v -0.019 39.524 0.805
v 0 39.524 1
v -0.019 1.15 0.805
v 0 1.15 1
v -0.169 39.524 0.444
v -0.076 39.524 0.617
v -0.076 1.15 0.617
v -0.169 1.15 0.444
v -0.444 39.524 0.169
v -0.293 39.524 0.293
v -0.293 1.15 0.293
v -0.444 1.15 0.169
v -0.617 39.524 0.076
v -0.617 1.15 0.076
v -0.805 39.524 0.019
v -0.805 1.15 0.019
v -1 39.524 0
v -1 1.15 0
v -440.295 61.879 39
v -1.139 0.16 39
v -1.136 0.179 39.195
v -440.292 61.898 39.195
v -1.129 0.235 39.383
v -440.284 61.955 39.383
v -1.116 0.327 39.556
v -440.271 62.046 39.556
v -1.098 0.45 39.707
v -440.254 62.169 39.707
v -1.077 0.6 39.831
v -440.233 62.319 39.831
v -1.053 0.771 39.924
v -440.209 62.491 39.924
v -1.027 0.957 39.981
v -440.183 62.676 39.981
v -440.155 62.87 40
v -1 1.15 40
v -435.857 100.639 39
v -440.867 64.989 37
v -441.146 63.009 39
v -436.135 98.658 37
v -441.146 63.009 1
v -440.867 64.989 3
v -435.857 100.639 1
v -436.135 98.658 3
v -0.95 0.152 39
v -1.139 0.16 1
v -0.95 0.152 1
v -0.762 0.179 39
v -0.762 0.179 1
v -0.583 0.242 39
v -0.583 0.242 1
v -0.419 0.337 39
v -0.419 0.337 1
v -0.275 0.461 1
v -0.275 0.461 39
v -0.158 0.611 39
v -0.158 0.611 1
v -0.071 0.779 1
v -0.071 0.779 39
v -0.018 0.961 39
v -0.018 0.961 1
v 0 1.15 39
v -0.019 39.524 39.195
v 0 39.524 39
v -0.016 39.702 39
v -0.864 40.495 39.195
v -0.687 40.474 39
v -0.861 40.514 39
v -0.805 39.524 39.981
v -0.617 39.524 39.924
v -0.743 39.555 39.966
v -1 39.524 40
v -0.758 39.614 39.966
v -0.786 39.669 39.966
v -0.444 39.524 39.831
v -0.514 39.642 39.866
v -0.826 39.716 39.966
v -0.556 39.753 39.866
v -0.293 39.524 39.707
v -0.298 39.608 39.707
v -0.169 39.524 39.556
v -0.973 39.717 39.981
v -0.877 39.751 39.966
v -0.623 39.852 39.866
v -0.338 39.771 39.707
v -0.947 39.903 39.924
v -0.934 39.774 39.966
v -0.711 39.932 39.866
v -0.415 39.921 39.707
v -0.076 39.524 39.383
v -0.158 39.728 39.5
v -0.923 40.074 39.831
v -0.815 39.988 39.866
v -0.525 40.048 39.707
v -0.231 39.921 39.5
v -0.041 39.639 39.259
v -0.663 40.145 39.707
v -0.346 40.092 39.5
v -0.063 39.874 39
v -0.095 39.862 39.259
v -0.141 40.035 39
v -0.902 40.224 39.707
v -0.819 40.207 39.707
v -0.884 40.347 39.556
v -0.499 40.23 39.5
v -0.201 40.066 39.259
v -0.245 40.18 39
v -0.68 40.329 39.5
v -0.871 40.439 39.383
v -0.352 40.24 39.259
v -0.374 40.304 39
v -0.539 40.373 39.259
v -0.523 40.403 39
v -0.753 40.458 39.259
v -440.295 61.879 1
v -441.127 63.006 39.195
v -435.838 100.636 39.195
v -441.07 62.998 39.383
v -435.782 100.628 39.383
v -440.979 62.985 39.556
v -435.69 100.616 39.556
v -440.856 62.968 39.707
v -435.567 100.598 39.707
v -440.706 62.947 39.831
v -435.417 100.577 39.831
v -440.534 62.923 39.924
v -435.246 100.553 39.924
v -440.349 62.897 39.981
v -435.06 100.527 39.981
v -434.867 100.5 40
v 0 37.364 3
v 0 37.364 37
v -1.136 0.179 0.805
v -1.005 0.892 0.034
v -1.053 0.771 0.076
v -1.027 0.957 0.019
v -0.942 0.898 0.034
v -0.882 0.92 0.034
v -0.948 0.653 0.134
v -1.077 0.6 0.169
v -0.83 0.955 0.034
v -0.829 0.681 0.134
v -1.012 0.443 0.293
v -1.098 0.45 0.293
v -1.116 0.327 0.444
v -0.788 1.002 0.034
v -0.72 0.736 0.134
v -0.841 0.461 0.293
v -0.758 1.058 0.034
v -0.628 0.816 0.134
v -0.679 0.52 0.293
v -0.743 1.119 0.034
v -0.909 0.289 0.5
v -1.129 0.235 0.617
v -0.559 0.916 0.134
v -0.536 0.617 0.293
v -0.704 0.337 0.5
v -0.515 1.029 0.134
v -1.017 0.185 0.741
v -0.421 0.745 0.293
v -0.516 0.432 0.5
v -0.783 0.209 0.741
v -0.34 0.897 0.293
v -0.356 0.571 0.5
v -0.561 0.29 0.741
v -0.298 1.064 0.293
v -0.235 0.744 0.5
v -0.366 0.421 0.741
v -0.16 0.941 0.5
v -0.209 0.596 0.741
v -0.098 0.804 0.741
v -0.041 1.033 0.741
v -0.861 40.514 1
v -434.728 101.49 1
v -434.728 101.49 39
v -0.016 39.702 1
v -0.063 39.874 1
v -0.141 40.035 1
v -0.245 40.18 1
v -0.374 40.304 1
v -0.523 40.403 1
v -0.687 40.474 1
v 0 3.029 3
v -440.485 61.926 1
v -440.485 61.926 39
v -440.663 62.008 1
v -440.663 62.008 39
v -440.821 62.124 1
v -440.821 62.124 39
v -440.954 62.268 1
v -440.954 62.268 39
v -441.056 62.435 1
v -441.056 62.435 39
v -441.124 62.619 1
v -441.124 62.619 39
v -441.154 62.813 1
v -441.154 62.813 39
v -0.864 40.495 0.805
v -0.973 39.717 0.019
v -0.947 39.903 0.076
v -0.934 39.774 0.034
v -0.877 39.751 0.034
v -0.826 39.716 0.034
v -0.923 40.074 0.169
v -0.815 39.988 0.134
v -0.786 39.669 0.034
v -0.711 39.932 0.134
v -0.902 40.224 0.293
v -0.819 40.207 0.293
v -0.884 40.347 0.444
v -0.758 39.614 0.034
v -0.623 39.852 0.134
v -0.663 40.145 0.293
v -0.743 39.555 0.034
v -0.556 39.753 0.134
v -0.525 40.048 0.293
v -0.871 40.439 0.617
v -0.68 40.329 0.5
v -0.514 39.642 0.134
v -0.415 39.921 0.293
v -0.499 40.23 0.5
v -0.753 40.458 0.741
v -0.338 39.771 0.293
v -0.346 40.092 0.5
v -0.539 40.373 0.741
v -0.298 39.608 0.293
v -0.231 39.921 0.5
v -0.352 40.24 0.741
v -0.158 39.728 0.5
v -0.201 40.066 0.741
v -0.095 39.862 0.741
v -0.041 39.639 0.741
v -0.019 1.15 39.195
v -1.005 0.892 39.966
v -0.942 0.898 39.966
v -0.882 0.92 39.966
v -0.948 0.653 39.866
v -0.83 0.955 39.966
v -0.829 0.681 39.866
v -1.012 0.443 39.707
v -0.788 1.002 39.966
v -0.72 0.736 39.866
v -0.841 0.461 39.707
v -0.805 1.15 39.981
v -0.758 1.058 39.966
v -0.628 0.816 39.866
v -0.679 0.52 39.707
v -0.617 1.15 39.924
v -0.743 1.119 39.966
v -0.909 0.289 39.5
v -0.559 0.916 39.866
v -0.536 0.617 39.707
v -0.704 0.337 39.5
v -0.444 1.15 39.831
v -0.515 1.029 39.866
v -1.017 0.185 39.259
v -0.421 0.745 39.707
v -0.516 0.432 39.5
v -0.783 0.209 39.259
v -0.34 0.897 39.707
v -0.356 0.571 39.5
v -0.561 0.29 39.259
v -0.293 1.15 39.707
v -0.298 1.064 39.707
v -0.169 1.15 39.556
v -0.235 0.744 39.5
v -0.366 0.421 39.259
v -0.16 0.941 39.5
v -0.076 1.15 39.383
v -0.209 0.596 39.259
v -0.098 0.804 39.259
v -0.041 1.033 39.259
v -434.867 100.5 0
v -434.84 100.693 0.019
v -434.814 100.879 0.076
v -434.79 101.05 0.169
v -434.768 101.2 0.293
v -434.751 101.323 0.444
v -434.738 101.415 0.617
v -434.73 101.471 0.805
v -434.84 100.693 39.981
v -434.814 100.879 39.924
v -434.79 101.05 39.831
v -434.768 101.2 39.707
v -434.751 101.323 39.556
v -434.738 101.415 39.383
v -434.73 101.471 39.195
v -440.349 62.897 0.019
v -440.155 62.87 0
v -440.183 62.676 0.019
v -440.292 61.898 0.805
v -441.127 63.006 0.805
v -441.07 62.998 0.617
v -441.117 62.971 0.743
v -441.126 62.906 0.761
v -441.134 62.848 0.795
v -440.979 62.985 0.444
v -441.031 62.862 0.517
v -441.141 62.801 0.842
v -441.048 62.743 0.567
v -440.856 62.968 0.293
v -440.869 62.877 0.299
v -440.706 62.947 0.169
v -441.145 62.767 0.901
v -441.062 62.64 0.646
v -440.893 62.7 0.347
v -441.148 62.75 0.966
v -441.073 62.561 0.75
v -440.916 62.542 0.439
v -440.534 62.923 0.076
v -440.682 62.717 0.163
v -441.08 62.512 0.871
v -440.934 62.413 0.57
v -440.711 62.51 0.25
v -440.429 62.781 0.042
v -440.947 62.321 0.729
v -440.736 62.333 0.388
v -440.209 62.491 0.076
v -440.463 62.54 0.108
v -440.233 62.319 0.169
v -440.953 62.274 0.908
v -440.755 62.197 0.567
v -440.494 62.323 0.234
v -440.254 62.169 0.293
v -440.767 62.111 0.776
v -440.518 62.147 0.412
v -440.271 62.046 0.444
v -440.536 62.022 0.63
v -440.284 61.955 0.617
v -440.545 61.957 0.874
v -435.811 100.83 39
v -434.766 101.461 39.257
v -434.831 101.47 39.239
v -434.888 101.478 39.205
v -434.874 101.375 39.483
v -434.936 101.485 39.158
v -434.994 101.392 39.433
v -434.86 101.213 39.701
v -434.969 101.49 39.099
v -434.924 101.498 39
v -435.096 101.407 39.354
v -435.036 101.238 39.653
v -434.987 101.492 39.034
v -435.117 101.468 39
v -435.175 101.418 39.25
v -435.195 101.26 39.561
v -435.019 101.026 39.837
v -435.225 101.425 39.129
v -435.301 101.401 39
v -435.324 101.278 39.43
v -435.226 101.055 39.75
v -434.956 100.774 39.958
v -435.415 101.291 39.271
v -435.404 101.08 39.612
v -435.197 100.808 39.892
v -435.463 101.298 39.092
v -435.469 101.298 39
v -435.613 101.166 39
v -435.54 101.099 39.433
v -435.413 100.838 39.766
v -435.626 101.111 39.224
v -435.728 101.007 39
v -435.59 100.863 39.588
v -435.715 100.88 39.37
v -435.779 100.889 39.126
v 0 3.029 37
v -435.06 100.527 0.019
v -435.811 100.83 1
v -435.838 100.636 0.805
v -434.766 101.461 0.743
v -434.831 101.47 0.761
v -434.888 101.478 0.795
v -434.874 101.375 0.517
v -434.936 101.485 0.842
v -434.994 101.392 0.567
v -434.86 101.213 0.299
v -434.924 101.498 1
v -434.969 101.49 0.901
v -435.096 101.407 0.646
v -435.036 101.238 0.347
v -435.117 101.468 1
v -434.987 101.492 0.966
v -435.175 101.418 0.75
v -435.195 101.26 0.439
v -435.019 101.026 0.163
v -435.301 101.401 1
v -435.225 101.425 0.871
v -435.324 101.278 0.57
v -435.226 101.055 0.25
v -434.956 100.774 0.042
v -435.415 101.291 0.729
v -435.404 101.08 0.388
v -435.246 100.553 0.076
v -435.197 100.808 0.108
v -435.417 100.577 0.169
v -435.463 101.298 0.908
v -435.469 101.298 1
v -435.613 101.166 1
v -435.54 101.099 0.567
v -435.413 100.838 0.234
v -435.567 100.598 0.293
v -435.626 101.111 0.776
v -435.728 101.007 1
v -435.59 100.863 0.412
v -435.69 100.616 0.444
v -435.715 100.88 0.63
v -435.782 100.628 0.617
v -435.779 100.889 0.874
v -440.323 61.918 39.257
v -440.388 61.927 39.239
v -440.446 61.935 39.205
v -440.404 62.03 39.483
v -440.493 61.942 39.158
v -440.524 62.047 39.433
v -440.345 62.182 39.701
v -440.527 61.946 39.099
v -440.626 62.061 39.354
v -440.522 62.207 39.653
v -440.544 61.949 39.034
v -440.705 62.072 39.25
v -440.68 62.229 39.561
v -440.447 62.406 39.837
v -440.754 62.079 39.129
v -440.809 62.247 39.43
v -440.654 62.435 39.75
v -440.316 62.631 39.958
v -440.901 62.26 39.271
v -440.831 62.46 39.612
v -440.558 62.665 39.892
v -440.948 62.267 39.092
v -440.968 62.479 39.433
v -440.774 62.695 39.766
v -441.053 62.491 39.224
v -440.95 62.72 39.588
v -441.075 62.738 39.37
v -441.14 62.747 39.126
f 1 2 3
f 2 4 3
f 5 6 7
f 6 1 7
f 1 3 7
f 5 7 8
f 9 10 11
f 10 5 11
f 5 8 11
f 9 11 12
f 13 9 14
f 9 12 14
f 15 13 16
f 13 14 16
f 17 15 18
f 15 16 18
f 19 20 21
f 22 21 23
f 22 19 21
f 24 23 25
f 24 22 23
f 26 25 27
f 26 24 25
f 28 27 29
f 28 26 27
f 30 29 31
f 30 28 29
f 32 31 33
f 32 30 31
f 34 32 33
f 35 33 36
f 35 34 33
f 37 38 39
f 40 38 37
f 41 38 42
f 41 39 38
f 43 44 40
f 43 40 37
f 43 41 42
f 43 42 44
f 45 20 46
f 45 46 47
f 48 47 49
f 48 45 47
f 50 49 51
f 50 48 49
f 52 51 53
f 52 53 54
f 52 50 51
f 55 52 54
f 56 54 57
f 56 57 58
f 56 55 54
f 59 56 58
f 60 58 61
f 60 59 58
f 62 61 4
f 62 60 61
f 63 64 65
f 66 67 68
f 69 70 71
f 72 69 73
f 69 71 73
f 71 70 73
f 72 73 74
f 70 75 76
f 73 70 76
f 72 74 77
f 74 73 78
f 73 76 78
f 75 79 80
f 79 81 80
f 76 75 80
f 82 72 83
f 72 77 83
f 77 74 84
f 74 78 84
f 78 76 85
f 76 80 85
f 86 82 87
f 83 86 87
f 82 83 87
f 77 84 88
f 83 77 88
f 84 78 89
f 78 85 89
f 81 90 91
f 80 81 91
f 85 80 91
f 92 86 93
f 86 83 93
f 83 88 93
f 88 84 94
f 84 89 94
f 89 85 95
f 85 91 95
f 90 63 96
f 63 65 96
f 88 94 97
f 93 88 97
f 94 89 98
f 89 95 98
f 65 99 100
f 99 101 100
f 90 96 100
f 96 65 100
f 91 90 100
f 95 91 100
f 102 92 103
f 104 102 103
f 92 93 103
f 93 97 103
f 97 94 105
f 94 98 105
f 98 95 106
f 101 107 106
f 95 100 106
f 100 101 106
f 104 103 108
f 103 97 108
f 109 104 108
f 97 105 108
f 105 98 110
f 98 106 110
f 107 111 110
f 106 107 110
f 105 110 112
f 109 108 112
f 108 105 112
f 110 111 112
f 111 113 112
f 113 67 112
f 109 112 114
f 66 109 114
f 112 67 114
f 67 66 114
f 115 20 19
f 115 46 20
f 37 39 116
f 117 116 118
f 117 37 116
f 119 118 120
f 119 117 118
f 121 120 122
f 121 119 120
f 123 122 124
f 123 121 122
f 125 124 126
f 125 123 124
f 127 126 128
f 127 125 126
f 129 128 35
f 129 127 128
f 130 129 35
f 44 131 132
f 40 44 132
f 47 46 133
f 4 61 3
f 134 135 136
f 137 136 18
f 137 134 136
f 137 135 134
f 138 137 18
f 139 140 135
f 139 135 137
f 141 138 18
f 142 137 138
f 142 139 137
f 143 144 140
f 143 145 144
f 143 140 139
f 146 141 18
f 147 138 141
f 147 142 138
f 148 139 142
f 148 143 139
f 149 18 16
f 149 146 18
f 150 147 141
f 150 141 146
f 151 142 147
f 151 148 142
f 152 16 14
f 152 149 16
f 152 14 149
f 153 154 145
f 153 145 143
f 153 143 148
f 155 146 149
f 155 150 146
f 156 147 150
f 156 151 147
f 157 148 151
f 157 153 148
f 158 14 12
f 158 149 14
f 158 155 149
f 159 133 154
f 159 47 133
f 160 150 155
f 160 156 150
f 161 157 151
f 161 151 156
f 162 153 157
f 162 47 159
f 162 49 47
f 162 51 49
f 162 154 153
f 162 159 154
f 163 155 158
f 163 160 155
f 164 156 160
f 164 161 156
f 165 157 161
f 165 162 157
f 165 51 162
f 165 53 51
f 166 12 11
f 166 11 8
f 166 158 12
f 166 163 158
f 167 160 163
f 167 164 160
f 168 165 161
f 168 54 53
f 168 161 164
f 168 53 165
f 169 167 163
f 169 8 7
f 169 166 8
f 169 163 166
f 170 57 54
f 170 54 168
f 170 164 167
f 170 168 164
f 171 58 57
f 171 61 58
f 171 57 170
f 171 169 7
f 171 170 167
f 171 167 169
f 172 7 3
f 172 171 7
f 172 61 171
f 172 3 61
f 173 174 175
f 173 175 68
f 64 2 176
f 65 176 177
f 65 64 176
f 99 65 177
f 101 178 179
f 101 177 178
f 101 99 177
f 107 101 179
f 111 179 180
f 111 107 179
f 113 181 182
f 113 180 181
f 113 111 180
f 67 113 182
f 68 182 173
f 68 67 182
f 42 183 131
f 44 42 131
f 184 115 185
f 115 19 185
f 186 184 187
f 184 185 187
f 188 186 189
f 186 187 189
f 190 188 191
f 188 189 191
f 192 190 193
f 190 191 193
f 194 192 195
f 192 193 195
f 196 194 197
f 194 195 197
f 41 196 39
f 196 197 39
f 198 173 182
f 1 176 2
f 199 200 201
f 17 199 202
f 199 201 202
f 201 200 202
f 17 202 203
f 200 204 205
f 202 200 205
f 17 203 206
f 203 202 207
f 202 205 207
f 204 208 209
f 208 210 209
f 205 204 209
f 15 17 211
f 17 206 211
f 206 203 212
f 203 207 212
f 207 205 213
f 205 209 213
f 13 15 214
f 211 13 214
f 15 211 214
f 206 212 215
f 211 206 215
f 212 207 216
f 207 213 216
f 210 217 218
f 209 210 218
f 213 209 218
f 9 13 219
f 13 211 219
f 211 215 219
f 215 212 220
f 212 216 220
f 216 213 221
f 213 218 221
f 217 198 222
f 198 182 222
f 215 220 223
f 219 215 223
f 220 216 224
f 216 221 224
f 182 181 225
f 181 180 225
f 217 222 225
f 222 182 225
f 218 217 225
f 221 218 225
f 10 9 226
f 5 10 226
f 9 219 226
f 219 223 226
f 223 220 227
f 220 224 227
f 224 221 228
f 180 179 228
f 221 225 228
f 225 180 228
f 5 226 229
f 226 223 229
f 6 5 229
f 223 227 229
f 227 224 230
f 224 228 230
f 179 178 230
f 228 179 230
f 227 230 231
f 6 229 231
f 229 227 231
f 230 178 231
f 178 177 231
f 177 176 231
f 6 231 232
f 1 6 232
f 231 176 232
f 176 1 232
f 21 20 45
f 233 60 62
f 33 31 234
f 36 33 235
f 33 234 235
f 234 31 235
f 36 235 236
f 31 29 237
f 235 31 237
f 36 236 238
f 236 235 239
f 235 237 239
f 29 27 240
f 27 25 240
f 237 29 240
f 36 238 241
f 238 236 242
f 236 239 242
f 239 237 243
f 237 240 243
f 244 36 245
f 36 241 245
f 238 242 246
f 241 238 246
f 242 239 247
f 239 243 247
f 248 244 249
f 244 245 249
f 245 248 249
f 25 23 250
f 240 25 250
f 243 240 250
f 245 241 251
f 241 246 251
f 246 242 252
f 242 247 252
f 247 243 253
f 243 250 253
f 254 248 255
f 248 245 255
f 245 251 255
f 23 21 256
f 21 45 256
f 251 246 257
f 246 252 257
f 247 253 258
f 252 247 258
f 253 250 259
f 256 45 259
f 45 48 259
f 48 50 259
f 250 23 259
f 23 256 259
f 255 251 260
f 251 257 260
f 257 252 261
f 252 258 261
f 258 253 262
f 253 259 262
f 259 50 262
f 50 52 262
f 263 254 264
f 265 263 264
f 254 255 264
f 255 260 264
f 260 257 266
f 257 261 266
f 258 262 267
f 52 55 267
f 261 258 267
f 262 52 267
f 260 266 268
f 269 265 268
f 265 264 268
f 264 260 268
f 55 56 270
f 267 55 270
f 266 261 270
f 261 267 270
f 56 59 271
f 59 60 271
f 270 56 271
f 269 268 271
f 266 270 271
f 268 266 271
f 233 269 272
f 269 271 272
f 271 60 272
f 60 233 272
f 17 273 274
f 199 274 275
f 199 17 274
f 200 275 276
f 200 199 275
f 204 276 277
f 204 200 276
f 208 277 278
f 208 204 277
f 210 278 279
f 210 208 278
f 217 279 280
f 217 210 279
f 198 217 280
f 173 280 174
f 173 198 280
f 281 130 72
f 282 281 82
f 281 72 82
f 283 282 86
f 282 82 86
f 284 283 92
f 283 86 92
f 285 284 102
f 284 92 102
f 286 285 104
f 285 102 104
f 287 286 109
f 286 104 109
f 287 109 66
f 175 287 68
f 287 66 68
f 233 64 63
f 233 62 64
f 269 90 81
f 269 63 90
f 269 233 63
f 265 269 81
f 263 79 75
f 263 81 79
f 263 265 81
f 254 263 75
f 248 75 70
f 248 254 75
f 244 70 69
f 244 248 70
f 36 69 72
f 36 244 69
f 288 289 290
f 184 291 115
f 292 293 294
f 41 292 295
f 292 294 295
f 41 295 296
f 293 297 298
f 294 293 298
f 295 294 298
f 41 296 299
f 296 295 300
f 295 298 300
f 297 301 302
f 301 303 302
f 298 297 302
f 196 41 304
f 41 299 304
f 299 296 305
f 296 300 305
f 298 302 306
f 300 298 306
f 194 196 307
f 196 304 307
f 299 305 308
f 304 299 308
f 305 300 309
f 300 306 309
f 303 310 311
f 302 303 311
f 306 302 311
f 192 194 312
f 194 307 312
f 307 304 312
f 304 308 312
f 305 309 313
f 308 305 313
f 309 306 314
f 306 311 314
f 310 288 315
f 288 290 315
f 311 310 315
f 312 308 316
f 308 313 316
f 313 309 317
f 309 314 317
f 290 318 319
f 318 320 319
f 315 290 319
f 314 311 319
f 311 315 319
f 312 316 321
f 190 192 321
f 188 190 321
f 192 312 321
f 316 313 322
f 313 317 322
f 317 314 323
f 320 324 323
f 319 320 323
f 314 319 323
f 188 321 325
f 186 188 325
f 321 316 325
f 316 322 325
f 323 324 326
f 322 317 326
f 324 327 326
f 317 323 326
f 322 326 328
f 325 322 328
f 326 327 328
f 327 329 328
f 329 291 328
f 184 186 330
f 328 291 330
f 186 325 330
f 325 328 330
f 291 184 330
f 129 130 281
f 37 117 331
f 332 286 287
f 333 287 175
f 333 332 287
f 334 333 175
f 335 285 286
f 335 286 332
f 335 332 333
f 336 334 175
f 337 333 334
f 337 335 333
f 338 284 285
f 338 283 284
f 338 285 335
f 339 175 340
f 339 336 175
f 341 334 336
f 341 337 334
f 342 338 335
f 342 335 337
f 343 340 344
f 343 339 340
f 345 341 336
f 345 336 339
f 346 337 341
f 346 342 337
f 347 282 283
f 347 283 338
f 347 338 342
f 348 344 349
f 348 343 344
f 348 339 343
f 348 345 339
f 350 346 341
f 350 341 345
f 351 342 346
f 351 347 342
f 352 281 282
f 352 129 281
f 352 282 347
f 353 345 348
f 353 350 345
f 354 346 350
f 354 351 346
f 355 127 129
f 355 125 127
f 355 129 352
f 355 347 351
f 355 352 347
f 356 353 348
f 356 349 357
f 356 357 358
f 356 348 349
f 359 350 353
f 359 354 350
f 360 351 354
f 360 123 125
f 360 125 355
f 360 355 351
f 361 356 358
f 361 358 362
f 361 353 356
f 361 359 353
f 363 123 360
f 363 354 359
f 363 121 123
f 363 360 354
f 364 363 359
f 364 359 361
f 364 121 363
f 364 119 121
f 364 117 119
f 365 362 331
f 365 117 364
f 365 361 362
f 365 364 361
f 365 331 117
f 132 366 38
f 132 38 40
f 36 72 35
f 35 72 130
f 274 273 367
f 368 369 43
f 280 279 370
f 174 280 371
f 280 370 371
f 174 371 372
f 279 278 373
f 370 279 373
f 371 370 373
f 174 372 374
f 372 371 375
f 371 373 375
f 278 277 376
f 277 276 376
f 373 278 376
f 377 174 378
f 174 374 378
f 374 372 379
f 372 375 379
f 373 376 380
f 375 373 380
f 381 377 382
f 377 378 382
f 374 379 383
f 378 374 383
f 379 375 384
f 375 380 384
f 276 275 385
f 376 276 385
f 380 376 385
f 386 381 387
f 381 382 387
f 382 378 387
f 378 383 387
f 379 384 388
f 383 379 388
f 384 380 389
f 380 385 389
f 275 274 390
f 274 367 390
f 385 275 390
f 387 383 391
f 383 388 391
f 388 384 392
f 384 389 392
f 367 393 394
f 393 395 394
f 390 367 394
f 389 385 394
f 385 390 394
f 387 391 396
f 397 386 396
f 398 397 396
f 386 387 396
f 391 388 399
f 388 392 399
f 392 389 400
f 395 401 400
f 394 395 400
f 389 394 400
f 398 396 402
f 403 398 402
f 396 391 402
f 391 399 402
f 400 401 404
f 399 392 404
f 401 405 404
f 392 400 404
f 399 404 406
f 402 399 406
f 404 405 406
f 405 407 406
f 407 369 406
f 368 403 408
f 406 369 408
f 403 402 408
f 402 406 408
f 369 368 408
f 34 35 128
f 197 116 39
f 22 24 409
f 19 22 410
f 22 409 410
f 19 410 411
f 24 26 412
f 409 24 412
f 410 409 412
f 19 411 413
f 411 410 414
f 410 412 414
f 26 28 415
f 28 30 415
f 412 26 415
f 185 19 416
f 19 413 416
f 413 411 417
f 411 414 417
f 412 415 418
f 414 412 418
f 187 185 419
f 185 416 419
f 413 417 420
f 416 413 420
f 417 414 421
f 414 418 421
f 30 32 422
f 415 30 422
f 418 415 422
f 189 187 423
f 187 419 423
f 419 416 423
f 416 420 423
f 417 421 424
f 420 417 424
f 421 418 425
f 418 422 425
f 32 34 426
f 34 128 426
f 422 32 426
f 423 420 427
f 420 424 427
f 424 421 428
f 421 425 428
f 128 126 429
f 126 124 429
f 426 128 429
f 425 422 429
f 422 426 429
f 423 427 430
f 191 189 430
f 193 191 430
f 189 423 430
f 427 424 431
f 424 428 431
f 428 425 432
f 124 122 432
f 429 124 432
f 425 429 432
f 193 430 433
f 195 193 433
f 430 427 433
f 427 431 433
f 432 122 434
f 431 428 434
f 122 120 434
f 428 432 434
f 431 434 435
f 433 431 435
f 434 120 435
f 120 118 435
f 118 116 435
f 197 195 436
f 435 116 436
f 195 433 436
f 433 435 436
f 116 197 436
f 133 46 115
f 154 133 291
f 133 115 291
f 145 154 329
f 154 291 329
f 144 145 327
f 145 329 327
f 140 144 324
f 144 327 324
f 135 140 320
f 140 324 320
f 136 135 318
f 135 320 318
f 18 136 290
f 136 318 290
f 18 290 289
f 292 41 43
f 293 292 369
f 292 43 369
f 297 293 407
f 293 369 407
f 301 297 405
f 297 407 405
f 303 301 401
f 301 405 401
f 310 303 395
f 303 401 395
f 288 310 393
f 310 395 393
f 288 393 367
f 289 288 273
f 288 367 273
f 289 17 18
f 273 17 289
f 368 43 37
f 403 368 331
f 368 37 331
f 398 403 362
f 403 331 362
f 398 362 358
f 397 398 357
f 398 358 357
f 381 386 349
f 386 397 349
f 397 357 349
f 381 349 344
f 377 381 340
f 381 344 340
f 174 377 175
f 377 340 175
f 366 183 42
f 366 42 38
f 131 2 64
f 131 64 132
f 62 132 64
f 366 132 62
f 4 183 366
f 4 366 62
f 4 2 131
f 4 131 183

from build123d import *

# Parameters (mm, degrees)
BOSS_EXTRUDE1_DEPTH = 40
SKETCH2_W           = 34
SKETCH2_H           = 34
CUT_EXTRUDE1_DEPTH  = 448.413276673
FILLET1_R           = 1


with BuildPart() as part:
    # Sketch1 → Boss-Extrude1 (new body)
    with BuildSketch(Plane.XY):
        Polygon((0, 0), (-441.284874285, 62.018544574), (-435.717950246, 101.629267323), (0, 40.393102901), align=None)
    extrude(amount=BOSS_EXTRUDE1_DEPTH)

    # Sketch2 → Cut-Extrude1 (cut, through all)
    with BuildSketch(Plane(origin=(-441.284874285, 62.018544574, 0), x_dir=(0, 0, 1), z_dir=(-0.9902680687415704, 0.13917310096006613, 0))):
        with Locations((20, 20)):
            Rectangle(SKETCH2_W, SKETCH2_H)
    extrude(amount=-CUT_EXTRUDE1_DEPTH, mode=Mode.SUBTRACT)

    # Fillet1
    fillet1_edges = [part.edges().sort_by_distance(p)[0] for p in [
        (-438.501412265, 81.823905948, 40),
        (-220.642437142, 31.009272287, 40),
        (0, 20.19655145, 40),
        (-220.642437142, 31.009272287, 0),
        (-438.501412265, 81.823905948, 0),
        (-217.858975123, 71.011185112, 0),
        (0, 20.19655145, 0),
        (-217.858975123, 71.011185112, 40),
        (0, 0, 20),
        (-441.284874285, 62.018544574, 20),
        (-435.717950246, 101.629267323, 20),
        (0, 40.393102901, 20),
    ]]
    fillet(fillet1_edges, radius=FILLET1_R)


solid = part.part
